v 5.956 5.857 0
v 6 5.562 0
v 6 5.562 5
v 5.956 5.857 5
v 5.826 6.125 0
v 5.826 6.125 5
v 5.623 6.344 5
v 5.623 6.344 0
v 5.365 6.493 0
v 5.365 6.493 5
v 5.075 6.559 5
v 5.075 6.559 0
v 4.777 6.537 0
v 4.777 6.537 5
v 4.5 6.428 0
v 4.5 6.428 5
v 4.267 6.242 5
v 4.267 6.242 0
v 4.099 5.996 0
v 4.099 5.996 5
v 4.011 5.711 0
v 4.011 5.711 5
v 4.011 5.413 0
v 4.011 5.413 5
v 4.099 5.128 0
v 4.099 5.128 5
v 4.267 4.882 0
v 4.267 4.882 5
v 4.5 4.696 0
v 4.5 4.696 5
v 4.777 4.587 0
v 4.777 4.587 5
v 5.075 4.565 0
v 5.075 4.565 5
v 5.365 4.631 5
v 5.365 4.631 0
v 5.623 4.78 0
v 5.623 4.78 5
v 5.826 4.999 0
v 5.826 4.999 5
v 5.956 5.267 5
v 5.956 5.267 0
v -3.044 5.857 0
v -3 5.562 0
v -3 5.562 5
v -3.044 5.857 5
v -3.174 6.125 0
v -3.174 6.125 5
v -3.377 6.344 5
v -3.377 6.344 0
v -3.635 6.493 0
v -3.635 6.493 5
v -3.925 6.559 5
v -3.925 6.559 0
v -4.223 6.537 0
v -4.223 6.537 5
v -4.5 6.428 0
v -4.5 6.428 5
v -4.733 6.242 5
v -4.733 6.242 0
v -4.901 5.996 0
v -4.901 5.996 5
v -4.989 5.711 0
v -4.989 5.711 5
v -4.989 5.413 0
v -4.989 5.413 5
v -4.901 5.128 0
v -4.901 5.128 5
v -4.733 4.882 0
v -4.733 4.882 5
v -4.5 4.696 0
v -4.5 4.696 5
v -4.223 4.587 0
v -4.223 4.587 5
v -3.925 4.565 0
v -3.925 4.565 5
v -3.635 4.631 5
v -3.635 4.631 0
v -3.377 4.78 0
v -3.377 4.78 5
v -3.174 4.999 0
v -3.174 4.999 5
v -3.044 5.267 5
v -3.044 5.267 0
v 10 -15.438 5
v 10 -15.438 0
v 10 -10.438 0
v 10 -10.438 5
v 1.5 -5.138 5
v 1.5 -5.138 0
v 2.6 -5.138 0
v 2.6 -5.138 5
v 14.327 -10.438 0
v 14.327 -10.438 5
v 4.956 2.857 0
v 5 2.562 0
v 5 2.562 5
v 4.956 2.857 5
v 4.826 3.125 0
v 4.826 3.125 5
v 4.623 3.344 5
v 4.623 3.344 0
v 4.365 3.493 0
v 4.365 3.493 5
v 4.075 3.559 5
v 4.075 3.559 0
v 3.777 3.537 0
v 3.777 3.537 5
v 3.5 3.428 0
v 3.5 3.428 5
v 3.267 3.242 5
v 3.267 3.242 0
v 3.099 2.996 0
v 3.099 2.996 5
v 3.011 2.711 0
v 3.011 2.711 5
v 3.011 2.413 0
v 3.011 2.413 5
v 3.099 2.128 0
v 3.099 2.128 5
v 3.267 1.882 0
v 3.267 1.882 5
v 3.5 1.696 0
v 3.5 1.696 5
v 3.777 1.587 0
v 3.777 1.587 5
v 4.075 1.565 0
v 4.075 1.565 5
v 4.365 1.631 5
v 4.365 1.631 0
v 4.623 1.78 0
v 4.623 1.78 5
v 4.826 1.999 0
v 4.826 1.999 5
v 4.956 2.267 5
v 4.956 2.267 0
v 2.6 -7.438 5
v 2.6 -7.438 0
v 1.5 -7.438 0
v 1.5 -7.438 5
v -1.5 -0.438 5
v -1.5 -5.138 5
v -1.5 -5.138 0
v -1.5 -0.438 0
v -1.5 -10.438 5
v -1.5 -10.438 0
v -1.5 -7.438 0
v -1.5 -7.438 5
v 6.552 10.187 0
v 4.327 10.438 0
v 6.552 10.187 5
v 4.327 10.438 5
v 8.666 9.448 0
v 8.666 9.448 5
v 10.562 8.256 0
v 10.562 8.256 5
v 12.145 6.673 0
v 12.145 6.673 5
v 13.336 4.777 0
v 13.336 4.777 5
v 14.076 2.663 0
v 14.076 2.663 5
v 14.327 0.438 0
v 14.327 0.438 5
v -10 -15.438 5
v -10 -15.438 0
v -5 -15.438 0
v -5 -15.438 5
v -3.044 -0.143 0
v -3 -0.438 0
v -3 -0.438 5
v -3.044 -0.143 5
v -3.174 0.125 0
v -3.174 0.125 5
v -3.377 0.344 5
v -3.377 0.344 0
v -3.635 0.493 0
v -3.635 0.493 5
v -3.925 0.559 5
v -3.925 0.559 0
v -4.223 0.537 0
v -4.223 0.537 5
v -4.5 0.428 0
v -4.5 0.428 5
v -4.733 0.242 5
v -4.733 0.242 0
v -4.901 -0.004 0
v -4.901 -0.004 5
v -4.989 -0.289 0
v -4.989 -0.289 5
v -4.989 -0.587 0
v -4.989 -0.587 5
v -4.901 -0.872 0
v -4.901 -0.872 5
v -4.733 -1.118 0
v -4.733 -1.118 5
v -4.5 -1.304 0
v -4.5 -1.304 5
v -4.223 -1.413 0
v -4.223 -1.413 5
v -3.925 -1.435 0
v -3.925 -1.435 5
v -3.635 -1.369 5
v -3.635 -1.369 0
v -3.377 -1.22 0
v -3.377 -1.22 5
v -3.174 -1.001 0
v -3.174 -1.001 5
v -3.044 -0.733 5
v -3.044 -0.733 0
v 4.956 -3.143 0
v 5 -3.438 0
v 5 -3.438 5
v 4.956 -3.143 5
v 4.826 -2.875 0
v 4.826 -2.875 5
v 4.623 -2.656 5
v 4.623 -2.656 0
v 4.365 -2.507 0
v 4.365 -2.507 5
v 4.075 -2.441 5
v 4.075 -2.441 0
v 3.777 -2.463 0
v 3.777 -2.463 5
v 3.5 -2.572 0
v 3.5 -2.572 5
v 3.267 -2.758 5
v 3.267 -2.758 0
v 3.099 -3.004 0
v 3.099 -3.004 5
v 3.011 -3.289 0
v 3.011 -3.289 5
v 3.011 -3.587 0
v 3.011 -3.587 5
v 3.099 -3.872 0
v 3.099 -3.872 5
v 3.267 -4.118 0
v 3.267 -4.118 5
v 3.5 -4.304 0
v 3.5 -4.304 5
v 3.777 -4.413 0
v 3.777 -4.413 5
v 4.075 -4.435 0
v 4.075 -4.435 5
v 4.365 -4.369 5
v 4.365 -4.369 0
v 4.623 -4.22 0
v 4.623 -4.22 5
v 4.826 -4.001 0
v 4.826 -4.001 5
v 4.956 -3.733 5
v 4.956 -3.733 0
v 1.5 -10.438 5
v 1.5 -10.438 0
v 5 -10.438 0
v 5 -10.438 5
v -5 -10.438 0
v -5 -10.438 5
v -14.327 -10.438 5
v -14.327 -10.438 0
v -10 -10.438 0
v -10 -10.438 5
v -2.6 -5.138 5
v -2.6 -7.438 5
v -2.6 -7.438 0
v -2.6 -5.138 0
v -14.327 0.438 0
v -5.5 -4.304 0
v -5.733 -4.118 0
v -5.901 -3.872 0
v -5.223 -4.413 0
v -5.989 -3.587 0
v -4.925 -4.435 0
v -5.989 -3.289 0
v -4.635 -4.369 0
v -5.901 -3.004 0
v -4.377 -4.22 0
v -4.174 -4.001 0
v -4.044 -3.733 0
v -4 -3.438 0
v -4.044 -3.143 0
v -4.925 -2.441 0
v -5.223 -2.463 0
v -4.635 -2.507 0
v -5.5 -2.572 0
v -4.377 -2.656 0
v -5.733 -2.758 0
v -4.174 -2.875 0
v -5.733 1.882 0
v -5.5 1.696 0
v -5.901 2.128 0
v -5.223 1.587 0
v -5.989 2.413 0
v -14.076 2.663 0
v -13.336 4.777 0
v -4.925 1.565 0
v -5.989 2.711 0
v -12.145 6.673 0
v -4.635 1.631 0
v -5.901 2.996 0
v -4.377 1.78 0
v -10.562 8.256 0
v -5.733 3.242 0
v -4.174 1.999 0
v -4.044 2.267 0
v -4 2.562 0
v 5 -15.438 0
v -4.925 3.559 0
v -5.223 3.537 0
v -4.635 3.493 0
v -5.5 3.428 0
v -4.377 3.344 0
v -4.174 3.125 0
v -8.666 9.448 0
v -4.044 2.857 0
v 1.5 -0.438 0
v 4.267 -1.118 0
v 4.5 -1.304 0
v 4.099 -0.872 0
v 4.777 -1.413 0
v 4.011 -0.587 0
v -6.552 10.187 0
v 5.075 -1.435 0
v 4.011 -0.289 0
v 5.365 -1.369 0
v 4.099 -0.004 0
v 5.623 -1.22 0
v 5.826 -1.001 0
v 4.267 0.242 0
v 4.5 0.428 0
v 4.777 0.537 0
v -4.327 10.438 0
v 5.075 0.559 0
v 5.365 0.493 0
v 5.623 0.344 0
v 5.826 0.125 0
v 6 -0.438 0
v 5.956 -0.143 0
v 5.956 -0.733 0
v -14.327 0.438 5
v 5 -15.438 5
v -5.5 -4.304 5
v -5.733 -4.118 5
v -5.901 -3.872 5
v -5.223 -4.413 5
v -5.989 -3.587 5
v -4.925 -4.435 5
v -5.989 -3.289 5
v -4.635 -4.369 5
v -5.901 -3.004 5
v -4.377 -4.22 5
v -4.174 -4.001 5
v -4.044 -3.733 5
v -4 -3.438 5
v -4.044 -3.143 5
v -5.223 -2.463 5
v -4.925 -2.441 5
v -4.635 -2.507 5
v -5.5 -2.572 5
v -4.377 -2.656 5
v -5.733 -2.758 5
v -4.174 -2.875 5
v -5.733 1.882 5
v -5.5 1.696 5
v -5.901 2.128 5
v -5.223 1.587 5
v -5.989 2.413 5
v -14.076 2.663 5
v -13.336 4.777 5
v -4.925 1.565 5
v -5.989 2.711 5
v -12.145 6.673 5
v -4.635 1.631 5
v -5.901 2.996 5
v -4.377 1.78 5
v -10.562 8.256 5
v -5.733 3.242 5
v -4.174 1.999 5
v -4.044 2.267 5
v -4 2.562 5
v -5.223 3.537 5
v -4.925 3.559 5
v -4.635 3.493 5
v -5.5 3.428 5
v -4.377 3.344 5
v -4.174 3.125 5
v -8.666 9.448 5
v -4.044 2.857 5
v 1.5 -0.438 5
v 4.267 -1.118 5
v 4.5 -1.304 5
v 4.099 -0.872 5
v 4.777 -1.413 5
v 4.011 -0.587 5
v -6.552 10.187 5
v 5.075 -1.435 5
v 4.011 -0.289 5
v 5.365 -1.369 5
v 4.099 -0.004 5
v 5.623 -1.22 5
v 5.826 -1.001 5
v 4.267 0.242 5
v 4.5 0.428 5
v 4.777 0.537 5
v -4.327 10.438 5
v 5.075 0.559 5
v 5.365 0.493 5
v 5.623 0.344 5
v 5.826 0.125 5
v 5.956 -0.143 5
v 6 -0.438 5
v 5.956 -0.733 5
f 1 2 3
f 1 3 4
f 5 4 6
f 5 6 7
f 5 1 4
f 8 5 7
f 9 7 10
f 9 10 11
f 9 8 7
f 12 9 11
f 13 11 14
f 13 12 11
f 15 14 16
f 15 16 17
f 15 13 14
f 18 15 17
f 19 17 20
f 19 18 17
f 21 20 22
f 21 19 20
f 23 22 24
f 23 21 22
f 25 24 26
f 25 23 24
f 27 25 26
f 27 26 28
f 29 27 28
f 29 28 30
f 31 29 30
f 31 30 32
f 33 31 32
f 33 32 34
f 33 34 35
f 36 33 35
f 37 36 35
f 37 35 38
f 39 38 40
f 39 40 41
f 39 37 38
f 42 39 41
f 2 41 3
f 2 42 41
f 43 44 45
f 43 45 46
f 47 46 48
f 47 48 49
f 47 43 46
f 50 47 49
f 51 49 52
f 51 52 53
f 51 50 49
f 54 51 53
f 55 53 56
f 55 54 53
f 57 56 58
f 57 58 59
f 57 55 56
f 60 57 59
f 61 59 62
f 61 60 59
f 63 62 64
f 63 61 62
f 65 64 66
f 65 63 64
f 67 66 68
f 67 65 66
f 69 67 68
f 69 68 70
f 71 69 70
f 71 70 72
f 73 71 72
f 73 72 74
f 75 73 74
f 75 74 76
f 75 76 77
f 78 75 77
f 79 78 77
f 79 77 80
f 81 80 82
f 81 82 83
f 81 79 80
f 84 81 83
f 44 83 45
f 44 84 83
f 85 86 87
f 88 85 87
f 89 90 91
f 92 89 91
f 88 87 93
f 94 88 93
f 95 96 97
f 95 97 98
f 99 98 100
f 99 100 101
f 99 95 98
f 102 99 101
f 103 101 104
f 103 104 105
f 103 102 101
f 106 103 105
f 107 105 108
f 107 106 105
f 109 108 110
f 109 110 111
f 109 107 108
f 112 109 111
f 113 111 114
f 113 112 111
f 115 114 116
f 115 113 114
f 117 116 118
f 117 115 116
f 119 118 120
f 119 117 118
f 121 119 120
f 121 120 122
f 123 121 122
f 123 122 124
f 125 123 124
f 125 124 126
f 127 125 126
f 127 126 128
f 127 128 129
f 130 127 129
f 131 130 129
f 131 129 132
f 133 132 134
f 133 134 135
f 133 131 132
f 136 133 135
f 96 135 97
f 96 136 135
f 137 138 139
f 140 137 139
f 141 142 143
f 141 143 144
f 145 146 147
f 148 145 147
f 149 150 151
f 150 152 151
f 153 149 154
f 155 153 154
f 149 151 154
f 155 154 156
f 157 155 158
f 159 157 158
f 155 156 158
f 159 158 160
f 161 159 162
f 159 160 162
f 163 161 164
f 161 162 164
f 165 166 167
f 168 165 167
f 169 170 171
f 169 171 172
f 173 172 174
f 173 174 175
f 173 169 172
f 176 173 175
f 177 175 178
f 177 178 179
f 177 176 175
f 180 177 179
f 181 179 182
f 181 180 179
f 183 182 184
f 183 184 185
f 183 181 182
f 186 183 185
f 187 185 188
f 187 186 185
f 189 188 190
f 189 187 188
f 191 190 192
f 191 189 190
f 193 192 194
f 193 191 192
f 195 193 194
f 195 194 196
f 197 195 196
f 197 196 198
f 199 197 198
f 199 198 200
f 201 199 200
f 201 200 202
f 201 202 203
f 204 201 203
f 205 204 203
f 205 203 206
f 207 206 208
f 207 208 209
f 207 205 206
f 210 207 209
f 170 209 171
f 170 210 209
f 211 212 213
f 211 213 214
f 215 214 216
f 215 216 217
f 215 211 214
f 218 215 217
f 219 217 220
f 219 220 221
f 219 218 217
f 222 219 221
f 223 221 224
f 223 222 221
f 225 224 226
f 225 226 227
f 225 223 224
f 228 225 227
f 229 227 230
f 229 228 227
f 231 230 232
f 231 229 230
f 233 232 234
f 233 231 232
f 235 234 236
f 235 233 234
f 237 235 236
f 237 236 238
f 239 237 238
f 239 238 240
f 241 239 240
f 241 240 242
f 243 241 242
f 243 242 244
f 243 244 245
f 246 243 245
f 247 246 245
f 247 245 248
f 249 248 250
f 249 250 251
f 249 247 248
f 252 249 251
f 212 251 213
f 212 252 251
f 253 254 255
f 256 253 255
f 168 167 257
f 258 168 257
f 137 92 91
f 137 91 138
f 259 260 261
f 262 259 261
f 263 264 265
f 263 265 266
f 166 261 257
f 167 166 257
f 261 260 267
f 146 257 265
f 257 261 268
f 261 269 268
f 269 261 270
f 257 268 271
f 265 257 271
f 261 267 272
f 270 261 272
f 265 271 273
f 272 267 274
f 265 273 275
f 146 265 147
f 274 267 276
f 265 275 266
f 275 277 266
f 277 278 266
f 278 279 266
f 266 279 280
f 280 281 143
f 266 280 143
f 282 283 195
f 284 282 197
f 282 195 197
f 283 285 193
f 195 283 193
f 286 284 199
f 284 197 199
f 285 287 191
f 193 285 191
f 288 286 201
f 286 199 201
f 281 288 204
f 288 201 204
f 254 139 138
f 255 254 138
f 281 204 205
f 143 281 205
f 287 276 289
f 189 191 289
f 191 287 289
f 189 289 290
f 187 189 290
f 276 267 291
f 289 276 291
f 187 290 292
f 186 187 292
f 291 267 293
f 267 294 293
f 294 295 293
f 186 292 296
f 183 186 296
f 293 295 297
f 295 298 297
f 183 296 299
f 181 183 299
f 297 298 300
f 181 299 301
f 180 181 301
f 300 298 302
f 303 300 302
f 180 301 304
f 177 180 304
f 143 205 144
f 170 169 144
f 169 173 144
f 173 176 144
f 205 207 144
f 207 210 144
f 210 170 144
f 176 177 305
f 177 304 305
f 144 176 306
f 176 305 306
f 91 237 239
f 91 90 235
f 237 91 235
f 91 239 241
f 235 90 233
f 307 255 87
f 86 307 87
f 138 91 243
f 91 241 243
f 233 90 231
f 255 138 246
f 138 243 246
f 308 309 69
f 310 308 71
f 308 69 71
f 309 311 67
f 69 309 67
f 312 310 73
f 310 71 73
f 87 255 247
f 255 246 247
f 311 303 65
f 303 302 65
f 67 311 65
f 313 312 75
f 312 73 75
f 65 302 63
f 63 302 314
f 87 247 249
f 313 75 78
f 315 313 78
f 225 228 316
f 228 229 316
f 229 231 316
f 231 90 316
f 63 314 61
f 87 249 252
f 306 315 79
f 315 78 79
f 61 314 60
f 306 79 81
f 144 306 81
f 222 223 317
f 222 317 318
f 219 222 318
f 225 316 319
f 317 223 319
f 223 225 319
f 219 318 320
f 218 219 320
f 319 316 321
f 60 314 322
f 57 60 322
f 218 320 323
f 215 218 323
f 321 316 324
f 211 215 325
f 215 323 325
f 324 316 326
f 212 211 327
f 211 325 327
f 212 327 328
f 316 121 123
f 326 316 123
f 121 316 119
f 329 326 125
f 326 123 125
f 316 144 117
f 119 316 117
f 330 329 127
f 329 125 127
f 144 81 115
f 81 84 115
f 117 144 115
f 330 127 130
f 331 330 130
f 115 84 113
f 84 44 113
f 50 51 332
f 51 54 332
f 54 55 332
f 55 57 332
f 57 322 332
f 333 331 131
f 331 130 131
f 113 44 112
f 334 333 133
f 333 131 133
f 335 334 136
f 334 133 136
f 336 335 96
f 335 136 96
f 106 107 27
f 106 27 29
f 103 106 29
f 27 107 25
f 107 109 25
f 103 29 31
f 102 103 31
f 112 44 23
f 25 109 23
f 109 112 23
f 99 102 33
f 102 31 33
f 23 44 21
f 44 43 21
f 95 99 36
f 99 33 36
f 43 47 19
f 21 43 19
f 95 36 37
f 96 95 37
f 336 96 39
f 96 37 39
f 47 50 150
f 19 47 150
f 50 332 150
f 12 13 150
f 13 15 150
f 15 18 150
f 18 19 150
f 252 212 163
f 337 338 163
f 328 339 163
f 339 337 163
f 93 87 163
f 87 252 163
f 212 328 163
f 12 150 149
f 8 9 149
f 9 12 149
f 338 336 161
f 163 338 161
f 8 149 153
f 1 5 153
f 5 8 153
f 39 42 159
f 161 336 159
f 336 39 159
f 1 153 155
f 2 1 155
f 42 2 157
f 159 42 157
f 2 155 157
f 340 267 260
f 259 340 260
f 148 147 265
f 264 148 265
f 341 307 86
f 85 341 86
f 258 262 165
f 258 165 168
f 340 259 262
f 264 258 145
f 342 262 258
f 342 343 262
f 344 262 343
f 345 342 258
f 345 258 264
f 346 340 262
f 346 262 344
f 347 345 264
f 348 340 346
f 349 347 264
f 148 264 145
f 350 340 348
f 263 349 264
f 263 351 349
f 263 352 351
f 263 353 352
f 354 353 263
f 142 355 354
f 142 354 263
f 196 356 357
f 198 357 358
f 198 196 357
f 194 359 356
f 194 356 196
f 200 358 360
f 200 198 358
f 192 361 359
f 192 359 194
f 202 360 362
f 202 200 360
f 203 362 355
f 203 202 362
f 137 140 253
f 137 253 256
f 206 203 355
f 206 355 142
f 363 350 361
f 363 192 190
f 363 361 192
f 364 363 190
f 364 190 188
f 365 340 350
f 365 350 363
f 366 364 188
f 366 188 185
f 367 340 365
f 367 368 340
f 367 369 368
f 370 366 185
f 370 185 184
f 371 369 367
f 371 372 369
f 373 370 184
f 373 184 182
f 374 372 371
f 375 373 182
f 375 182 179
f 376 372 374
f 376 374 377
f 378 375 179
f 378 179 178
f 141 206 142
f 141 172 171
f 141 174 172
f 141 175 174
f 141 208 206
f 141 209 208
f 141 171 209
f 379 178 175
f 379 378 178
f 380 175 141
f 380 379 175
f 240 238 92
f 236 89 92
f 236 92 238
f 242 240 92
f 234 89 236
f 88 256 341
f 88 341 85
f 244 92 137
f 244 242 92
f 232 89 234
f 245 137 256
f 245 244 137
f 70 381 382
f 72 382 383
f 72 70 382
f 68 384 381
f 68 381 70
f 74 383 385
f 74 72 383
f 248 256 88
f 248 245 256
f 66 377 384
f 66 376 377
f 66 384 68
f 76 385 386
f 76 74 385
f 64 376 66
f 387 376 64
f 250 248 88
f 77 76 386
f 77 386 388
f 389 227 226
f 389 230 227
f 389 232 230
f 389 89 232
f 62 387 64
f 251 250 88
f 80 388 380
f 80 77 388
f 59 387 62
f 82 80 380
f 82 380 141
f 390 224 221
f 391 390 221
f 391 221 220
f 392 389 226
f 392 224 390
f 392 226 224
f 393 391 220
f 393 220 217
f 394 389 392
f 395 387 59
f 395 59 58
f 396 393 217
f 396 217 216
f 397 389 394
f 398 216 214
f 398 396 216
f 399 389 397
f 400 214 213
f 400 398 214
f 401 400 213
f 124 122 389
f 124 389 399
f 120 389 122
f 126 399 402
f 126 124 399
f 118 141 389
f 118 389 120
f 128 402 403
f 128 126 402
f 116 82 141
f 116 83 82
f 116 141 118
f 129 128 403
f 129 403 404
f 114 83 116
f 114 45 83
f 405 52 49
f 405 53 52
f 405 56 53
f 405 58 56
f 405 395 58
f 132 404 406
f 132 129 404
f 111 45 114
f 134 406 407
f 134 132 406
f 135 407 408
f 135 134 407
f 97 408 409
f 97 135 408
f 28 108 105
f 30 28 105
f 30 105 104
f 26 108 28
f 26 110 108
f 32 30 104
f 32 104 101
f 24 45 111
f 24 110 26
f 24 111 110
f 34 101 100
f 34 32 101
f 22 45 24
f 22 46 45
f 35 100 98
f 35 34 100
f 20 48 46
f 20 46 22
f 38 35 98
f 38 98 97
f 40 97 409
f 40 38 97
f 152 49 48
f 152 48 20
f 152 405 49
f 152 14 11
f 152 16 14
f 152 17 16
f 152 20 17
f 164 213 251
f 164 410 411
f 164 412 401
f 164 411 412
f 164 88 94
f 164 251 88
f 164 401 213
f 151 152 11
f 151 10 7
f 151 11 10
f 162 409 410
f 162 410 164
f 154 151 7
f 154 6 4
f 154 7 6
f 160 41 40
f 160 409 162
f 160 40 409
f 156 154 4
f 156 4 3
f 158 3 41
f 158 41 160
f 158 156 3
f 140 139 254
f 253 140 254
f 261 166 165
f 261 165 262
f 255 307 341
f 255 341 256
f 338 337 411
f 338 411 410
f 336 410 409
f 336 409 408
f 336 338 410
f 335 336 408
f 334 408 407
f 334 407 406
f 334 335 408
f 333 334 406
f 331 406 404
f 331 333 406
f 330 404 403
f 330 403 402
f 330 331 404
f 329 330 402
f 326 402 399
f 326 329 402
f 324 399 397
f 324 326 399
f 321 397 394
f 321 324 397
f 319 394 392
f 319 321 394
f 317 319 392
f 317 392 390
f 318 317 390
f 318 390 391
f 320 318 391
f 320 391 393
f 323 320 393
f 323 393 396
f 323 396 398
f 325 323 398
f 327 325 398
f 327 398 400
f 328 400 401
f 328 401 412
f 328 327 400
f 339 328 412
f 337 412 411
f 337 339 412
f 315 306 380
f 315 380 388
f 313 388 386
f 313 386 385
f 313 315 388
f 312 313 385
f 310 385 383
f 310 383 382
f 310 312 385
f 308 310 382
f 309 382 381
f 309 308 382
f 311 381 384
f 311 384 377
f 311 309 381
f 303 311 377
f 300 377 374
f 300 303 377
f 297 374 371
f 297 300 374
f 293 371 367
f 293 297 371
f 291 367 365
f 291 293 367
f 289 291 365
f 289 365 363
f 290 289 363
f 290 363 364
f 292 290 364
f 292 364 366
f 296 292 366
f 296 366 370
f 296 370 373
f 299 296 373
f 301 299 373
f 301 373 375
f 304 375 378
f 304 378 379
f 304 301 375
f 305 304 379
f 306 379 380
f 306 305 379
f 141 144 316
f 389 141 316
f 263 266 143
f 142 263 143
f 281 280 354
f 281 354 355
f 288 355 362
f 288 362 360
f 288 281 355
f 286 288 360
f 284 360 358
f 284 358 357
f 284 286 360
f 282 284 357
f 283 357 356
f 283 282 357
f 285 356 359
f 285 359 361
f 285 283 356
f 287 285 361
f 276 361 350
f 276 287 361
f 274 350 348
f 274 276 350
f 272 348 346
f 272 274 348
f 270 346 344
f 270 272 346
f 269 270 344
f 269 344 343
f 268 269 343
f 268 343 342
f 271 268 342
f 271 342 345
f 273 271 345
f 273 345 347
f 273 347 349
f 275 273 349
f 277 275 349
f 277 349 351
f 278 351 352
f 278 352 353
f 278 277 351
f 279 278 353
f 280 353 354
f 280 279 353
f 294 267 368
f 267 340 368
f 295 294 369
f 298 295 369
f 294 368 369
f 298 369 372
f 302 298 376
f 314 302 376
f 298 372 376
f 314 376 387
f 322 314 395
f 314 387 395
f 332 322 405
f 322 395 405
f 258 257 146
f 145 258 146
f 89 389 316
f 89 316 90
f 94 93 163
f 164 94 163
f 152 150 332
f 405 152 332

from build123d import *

# Parameters (mm, degrees)
SKETCH1_R           = 1
SKETCH1_W           = 5
SKETCH1_H           = 5
BOSS_EXTRUDE1_DEPTH = 5
FILLET1_R           = 10


with BuildPart() as part:
    # Sketch1 → Boss-Extrude1 (new body)
    # profile 1 of 3: a face of its own
    with BuildSketch(Plane.XY):
        Polygon((-14.326662673, 10.43799709), (-14.326662673, -10.43799709), (-10, -10.43799709), (-5, -10.43799709), (-1.5, -10.43799709), (-1.5, -7.43799709), (-2.6, -7.43799709), (-2.6, -5.13799709), (-1.5, -5.13799709), (-1.5, -0.43799709), (1.5, -0.43799709), (1.5, -5.13799709), (2.6, -5.13799709), (2.6, -7.43799709), (1.5, -7.43799709), (1.5, -10.43799709), (5, -10.43799709), (10, -10.43799709), (14.326662673, -10.43799709), (14.326662673, 10.43799709), align=None)
        with Locations((-5, -3.43799709)):
            Circle(SKETCH1_R, mode=Mode.SUBTRACT)
        with Locations((4, -3.43799709)):
            Circle(SKETCH1_R, mode=Mode.SUBTRACT)
        with Locations((-4, -0.43799709)):
            Circle(SKETCH1_R, mode=Mode.SUBTRACT)
        with Locations((-5, 2.56200291)):
            Circle(SKETCH1_R, mode=Mode.SUBTRACT)
        with Locations((-4, 5.56200291)):
            Circle(SKETCH1_R, mode=Mode.SUBTRACT)
        with Locations((5, -0.43799709)):
            Circle(SKETCH1_R, mode=Mode.SUBTRACT)
        with Locations((4, 2.56200291)):
            Circle(SKETCH1_R, mode=Mode.SUBTRACT)
        with Locations((5, 5.56200291)):
            Circle(SKETCH1_R, mode=Mode.SUBTRACT)
    # profile 2 of 3: a face of its own
    with BuildSketch(Plane.XY):
        with Locations((-7.5, -12.93799709)):
            Rectangle(SKETCH1_W, SKETCH1_H)
    # profile 3 of 3: a face of its own
    with BuildSketch(Plane.XY):
        with Locations((7.5, -12.93799709)):
            Rectangle(SKETCH1_W, SKETCH1_H)
    extrude(amount=BOSS_EXTRUDE1_DEPTH)

    # Fillet1
    fillet1_edges = [part.edges().sort_by_distance(p)[0] for p in [
        (-14.326662673, 10.43799709, 2.5),
        (14.326662673, 10.43799709, 2.5),
    ]]
    fillet(fillet1_edges, radius=FILLET1_R)


solid = part.part
